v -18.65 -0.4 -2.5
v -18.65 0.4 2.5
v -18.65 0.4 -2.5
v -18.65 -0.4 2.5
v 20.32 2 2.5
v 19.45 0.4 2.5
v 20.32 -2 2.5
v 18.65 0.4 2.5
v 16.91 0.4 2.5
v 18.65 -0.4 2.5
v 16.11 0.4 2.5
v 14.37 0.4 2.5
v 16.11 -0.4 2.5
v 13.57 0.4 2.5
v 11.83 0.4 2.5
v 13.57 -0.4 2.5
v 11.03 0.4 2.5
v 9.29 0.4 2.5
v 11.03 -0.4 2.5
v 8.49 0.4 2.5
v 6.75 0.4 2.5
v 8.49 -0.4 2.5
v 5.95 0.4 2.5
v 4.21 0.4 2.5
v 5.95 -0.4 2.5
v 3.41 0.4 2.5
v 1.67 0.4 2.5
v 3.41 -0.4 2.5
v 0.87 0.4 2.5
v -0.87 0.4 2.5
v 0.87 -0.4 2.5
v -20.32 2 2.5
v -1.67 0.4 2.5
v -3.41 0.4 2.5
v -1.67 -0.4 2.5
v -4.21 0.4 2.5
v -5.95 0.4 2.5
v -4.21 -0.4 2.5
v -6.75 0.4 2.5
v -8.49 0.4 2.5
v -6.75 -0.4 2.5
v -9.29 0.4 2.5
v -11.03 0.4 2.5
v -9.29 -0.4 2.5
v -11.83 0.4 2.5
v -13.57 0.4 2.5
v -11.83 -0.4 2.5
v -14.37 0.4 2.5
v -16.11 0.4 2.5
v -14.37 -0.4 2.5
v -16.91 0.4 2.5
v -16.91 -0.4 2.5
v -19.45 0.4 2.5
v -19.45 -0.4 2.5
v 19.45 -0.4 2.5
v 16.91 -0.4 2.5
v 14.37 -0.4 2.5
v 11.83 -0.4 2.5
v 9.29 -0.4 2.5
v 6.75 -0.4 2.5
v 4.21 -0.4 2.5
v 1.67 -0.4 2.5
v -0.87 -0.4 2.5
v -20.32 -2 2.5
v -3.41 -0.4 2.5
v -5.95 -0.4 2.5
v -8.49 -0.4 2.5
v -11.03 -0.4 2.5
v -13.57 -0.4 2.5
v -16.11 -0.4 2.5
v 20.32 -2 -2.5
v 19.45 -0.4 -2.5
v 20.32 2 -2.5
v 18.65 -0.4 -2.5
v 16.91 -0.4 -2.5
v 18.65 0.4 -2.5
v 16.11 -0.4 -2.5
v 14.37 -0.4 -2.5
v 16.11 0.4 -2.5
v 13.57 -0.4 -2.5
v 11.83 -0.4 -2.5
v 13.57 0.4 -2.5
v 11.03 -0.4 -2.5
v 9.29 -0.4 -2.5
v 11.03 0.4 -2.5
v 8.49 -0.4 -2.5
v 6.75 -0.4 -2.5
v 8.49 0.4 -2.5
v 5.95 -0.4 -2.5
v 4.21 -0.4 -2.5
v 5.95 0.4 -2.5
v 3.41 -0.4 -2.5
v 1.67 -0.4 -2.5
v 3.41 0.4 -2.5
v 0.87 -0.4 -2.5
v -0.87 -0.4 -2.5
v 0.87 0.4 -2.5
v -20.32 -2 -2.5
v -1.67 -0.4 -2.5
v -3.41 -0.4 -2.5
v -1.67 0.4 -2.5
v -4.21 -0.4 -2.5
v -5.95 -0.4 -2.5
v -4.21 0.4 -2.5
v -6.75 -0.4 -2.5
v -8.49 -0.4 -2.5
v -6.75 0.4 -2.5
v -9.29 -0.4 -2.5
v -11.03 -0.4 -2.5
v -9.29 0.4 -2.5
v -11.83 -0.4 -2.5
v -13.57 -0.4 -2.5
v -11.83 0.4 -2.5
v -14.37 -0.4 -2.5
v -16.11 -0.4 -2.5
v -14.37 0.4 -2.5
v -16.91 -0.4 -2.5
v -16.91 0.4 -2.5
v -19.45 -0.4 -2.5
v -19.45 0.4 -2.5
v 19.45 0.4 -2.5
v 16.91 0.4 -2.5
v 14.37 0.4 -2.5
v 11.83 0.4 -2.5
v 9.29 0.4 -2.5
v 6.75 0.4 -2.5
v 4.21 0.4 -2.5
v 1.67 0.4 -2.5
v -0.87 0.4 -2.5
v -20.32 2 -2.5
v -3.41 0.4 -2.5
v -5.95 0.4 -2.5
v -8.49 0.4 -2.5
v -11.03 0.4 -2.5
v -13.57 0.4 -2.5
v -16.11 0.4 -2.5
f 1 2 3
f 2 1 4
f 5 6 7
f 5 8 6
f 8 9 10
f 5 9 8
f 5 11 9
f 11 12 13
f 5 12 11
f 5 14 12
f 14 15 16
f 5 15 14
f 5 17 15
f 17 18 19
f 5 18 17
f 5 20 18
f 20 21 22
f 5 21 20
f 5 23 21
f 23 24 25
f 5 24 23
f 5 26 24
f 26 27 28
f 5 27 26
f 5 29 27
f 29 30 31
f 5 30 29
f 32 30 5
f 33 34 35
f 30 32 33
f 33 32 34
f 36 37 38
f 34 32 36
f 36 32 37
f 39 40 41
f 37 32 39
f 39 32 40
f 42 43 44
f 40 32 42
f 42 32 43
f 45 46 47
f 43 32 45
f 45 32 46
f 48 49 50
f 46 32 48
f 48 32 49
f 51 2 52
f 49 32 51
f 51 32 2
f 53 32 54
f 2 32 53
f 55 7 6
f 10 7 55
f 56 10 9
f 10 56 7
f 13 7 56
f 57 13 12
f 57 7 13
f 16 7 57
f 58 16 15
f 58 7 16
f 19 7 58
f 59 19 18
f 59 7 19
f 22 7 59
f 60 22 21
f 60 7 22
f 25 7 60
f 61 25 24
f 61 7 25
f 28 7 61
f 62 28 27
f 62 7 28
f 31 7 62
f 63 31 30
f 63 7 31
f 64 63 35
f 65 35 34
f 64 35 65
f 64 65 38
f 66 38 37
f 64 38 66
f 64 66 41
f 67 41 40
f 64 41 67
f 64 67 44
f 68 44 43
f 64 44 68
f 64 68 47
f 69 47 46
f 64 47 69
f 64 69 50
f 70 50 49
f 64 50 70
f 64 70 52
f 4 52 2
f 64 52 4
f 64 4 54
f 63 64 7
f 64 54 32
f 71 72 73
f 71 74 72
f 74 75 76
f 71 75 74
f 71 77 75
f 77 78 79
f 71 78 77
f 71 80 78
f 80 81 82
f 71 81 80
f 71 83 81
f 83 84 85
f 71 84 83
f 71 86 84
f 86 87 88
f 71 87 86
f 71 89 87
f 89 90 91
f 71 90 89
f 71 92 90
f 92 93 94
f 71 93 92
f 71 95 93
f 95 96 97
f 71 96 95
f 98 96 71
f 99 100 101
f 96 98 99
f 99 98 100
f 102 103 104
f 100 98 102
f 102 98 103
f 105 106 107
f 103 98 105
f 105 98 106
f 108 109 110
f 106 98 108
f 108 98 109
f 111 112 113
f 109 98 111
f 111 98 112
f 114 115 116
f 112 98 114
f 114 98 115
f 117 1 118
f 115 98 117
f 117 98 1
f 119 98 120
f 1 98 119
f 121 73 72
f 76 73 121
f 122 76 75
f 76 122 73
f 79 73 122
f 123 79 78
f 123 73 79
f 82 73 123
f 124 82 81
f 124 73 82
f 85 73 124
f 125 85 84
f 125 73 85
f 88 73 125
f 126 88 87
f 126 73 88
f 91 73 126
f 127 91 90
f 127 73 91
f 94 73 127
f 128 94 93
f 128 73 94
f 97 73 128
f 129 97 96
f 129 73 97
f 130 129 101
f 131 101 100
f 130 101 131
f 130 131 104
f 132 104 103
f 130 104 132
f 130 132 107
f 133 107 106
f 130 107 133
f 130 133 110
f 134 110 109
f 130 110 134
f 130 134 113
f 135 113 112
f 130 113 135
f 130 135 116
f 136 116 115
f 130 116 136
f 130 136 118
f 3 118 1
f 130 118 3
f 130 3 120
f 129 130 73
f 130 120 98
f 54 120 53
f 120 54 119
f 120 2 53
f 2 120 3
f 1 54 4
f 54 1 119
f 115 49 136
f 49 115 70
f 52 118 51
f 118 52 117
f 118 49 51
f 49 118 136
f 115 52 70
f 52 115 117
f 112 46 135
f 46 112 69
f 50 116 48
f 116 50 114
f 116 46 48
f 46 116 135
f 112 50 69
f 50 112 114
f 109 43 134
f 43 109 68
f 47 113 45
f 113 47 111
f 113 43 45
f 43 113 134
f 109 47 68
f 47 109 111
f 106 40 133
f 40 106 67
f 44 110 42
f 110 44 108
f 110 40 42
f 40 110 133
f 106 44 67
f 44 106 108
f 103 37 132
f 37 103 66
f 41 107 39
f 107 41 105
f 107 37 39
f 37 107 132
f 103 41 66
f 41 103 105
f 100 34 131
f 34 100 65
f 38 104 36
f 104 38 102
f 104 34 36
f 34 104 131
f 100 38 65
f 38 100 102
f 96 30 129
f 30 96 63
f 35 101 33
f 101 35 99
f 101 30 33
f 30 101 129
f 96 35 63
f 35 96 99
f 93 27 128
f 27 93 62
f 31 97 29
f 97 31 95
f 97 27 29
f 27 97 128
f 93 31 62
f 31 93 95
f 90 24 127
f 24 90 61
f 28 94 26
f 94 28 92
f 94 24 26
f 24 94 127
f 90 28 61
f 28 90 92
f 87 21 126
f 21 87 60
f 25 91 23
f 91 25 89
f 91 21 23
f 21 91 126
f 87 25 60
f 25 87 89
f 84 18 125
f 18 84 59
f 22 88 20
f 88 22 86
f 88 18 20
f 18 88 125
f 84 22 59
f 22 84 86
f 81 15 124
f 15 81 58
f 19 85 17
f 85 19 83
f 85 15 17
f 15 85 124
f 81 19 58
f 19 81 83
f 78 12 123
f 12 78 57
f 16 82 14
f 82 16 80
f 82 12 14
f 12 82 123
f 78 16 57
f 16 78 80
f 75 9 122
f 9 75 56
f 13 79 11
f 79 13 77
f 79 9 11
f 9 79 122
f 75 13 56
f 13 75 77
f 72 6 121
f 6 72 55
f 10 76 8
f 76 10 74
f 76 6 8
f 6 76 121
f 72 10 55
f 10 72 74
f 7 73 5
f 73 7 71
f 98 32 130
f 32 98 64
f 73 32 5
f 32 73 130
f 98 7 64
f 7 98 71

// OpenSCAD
tray_bottom_thickness = 1;

// commonly leads are .64mm square or .50mm round

lead_width = 0.8;
// most common spacing is 0.1in (2.54mm)
lead_spacing = 2.54;
height = 5.0;

/* Parts  ---------------------------------------------------------------*/

module lead_cutout(x, y, z) {
    translate([x, y, z])
        // cylinder(h=tray_bottom_thickness+height, r=lead_radius, center=true, $fn=15);
        cube([lead_width, lead_width, height], center=true);
}

difference() {
    cube([16 * lead_spacing, 4, height], center=true);

    for (i=[0:1:15])
        lead_cutout(lead_spacing * (-7.5 + i), 0 , 0);
}
